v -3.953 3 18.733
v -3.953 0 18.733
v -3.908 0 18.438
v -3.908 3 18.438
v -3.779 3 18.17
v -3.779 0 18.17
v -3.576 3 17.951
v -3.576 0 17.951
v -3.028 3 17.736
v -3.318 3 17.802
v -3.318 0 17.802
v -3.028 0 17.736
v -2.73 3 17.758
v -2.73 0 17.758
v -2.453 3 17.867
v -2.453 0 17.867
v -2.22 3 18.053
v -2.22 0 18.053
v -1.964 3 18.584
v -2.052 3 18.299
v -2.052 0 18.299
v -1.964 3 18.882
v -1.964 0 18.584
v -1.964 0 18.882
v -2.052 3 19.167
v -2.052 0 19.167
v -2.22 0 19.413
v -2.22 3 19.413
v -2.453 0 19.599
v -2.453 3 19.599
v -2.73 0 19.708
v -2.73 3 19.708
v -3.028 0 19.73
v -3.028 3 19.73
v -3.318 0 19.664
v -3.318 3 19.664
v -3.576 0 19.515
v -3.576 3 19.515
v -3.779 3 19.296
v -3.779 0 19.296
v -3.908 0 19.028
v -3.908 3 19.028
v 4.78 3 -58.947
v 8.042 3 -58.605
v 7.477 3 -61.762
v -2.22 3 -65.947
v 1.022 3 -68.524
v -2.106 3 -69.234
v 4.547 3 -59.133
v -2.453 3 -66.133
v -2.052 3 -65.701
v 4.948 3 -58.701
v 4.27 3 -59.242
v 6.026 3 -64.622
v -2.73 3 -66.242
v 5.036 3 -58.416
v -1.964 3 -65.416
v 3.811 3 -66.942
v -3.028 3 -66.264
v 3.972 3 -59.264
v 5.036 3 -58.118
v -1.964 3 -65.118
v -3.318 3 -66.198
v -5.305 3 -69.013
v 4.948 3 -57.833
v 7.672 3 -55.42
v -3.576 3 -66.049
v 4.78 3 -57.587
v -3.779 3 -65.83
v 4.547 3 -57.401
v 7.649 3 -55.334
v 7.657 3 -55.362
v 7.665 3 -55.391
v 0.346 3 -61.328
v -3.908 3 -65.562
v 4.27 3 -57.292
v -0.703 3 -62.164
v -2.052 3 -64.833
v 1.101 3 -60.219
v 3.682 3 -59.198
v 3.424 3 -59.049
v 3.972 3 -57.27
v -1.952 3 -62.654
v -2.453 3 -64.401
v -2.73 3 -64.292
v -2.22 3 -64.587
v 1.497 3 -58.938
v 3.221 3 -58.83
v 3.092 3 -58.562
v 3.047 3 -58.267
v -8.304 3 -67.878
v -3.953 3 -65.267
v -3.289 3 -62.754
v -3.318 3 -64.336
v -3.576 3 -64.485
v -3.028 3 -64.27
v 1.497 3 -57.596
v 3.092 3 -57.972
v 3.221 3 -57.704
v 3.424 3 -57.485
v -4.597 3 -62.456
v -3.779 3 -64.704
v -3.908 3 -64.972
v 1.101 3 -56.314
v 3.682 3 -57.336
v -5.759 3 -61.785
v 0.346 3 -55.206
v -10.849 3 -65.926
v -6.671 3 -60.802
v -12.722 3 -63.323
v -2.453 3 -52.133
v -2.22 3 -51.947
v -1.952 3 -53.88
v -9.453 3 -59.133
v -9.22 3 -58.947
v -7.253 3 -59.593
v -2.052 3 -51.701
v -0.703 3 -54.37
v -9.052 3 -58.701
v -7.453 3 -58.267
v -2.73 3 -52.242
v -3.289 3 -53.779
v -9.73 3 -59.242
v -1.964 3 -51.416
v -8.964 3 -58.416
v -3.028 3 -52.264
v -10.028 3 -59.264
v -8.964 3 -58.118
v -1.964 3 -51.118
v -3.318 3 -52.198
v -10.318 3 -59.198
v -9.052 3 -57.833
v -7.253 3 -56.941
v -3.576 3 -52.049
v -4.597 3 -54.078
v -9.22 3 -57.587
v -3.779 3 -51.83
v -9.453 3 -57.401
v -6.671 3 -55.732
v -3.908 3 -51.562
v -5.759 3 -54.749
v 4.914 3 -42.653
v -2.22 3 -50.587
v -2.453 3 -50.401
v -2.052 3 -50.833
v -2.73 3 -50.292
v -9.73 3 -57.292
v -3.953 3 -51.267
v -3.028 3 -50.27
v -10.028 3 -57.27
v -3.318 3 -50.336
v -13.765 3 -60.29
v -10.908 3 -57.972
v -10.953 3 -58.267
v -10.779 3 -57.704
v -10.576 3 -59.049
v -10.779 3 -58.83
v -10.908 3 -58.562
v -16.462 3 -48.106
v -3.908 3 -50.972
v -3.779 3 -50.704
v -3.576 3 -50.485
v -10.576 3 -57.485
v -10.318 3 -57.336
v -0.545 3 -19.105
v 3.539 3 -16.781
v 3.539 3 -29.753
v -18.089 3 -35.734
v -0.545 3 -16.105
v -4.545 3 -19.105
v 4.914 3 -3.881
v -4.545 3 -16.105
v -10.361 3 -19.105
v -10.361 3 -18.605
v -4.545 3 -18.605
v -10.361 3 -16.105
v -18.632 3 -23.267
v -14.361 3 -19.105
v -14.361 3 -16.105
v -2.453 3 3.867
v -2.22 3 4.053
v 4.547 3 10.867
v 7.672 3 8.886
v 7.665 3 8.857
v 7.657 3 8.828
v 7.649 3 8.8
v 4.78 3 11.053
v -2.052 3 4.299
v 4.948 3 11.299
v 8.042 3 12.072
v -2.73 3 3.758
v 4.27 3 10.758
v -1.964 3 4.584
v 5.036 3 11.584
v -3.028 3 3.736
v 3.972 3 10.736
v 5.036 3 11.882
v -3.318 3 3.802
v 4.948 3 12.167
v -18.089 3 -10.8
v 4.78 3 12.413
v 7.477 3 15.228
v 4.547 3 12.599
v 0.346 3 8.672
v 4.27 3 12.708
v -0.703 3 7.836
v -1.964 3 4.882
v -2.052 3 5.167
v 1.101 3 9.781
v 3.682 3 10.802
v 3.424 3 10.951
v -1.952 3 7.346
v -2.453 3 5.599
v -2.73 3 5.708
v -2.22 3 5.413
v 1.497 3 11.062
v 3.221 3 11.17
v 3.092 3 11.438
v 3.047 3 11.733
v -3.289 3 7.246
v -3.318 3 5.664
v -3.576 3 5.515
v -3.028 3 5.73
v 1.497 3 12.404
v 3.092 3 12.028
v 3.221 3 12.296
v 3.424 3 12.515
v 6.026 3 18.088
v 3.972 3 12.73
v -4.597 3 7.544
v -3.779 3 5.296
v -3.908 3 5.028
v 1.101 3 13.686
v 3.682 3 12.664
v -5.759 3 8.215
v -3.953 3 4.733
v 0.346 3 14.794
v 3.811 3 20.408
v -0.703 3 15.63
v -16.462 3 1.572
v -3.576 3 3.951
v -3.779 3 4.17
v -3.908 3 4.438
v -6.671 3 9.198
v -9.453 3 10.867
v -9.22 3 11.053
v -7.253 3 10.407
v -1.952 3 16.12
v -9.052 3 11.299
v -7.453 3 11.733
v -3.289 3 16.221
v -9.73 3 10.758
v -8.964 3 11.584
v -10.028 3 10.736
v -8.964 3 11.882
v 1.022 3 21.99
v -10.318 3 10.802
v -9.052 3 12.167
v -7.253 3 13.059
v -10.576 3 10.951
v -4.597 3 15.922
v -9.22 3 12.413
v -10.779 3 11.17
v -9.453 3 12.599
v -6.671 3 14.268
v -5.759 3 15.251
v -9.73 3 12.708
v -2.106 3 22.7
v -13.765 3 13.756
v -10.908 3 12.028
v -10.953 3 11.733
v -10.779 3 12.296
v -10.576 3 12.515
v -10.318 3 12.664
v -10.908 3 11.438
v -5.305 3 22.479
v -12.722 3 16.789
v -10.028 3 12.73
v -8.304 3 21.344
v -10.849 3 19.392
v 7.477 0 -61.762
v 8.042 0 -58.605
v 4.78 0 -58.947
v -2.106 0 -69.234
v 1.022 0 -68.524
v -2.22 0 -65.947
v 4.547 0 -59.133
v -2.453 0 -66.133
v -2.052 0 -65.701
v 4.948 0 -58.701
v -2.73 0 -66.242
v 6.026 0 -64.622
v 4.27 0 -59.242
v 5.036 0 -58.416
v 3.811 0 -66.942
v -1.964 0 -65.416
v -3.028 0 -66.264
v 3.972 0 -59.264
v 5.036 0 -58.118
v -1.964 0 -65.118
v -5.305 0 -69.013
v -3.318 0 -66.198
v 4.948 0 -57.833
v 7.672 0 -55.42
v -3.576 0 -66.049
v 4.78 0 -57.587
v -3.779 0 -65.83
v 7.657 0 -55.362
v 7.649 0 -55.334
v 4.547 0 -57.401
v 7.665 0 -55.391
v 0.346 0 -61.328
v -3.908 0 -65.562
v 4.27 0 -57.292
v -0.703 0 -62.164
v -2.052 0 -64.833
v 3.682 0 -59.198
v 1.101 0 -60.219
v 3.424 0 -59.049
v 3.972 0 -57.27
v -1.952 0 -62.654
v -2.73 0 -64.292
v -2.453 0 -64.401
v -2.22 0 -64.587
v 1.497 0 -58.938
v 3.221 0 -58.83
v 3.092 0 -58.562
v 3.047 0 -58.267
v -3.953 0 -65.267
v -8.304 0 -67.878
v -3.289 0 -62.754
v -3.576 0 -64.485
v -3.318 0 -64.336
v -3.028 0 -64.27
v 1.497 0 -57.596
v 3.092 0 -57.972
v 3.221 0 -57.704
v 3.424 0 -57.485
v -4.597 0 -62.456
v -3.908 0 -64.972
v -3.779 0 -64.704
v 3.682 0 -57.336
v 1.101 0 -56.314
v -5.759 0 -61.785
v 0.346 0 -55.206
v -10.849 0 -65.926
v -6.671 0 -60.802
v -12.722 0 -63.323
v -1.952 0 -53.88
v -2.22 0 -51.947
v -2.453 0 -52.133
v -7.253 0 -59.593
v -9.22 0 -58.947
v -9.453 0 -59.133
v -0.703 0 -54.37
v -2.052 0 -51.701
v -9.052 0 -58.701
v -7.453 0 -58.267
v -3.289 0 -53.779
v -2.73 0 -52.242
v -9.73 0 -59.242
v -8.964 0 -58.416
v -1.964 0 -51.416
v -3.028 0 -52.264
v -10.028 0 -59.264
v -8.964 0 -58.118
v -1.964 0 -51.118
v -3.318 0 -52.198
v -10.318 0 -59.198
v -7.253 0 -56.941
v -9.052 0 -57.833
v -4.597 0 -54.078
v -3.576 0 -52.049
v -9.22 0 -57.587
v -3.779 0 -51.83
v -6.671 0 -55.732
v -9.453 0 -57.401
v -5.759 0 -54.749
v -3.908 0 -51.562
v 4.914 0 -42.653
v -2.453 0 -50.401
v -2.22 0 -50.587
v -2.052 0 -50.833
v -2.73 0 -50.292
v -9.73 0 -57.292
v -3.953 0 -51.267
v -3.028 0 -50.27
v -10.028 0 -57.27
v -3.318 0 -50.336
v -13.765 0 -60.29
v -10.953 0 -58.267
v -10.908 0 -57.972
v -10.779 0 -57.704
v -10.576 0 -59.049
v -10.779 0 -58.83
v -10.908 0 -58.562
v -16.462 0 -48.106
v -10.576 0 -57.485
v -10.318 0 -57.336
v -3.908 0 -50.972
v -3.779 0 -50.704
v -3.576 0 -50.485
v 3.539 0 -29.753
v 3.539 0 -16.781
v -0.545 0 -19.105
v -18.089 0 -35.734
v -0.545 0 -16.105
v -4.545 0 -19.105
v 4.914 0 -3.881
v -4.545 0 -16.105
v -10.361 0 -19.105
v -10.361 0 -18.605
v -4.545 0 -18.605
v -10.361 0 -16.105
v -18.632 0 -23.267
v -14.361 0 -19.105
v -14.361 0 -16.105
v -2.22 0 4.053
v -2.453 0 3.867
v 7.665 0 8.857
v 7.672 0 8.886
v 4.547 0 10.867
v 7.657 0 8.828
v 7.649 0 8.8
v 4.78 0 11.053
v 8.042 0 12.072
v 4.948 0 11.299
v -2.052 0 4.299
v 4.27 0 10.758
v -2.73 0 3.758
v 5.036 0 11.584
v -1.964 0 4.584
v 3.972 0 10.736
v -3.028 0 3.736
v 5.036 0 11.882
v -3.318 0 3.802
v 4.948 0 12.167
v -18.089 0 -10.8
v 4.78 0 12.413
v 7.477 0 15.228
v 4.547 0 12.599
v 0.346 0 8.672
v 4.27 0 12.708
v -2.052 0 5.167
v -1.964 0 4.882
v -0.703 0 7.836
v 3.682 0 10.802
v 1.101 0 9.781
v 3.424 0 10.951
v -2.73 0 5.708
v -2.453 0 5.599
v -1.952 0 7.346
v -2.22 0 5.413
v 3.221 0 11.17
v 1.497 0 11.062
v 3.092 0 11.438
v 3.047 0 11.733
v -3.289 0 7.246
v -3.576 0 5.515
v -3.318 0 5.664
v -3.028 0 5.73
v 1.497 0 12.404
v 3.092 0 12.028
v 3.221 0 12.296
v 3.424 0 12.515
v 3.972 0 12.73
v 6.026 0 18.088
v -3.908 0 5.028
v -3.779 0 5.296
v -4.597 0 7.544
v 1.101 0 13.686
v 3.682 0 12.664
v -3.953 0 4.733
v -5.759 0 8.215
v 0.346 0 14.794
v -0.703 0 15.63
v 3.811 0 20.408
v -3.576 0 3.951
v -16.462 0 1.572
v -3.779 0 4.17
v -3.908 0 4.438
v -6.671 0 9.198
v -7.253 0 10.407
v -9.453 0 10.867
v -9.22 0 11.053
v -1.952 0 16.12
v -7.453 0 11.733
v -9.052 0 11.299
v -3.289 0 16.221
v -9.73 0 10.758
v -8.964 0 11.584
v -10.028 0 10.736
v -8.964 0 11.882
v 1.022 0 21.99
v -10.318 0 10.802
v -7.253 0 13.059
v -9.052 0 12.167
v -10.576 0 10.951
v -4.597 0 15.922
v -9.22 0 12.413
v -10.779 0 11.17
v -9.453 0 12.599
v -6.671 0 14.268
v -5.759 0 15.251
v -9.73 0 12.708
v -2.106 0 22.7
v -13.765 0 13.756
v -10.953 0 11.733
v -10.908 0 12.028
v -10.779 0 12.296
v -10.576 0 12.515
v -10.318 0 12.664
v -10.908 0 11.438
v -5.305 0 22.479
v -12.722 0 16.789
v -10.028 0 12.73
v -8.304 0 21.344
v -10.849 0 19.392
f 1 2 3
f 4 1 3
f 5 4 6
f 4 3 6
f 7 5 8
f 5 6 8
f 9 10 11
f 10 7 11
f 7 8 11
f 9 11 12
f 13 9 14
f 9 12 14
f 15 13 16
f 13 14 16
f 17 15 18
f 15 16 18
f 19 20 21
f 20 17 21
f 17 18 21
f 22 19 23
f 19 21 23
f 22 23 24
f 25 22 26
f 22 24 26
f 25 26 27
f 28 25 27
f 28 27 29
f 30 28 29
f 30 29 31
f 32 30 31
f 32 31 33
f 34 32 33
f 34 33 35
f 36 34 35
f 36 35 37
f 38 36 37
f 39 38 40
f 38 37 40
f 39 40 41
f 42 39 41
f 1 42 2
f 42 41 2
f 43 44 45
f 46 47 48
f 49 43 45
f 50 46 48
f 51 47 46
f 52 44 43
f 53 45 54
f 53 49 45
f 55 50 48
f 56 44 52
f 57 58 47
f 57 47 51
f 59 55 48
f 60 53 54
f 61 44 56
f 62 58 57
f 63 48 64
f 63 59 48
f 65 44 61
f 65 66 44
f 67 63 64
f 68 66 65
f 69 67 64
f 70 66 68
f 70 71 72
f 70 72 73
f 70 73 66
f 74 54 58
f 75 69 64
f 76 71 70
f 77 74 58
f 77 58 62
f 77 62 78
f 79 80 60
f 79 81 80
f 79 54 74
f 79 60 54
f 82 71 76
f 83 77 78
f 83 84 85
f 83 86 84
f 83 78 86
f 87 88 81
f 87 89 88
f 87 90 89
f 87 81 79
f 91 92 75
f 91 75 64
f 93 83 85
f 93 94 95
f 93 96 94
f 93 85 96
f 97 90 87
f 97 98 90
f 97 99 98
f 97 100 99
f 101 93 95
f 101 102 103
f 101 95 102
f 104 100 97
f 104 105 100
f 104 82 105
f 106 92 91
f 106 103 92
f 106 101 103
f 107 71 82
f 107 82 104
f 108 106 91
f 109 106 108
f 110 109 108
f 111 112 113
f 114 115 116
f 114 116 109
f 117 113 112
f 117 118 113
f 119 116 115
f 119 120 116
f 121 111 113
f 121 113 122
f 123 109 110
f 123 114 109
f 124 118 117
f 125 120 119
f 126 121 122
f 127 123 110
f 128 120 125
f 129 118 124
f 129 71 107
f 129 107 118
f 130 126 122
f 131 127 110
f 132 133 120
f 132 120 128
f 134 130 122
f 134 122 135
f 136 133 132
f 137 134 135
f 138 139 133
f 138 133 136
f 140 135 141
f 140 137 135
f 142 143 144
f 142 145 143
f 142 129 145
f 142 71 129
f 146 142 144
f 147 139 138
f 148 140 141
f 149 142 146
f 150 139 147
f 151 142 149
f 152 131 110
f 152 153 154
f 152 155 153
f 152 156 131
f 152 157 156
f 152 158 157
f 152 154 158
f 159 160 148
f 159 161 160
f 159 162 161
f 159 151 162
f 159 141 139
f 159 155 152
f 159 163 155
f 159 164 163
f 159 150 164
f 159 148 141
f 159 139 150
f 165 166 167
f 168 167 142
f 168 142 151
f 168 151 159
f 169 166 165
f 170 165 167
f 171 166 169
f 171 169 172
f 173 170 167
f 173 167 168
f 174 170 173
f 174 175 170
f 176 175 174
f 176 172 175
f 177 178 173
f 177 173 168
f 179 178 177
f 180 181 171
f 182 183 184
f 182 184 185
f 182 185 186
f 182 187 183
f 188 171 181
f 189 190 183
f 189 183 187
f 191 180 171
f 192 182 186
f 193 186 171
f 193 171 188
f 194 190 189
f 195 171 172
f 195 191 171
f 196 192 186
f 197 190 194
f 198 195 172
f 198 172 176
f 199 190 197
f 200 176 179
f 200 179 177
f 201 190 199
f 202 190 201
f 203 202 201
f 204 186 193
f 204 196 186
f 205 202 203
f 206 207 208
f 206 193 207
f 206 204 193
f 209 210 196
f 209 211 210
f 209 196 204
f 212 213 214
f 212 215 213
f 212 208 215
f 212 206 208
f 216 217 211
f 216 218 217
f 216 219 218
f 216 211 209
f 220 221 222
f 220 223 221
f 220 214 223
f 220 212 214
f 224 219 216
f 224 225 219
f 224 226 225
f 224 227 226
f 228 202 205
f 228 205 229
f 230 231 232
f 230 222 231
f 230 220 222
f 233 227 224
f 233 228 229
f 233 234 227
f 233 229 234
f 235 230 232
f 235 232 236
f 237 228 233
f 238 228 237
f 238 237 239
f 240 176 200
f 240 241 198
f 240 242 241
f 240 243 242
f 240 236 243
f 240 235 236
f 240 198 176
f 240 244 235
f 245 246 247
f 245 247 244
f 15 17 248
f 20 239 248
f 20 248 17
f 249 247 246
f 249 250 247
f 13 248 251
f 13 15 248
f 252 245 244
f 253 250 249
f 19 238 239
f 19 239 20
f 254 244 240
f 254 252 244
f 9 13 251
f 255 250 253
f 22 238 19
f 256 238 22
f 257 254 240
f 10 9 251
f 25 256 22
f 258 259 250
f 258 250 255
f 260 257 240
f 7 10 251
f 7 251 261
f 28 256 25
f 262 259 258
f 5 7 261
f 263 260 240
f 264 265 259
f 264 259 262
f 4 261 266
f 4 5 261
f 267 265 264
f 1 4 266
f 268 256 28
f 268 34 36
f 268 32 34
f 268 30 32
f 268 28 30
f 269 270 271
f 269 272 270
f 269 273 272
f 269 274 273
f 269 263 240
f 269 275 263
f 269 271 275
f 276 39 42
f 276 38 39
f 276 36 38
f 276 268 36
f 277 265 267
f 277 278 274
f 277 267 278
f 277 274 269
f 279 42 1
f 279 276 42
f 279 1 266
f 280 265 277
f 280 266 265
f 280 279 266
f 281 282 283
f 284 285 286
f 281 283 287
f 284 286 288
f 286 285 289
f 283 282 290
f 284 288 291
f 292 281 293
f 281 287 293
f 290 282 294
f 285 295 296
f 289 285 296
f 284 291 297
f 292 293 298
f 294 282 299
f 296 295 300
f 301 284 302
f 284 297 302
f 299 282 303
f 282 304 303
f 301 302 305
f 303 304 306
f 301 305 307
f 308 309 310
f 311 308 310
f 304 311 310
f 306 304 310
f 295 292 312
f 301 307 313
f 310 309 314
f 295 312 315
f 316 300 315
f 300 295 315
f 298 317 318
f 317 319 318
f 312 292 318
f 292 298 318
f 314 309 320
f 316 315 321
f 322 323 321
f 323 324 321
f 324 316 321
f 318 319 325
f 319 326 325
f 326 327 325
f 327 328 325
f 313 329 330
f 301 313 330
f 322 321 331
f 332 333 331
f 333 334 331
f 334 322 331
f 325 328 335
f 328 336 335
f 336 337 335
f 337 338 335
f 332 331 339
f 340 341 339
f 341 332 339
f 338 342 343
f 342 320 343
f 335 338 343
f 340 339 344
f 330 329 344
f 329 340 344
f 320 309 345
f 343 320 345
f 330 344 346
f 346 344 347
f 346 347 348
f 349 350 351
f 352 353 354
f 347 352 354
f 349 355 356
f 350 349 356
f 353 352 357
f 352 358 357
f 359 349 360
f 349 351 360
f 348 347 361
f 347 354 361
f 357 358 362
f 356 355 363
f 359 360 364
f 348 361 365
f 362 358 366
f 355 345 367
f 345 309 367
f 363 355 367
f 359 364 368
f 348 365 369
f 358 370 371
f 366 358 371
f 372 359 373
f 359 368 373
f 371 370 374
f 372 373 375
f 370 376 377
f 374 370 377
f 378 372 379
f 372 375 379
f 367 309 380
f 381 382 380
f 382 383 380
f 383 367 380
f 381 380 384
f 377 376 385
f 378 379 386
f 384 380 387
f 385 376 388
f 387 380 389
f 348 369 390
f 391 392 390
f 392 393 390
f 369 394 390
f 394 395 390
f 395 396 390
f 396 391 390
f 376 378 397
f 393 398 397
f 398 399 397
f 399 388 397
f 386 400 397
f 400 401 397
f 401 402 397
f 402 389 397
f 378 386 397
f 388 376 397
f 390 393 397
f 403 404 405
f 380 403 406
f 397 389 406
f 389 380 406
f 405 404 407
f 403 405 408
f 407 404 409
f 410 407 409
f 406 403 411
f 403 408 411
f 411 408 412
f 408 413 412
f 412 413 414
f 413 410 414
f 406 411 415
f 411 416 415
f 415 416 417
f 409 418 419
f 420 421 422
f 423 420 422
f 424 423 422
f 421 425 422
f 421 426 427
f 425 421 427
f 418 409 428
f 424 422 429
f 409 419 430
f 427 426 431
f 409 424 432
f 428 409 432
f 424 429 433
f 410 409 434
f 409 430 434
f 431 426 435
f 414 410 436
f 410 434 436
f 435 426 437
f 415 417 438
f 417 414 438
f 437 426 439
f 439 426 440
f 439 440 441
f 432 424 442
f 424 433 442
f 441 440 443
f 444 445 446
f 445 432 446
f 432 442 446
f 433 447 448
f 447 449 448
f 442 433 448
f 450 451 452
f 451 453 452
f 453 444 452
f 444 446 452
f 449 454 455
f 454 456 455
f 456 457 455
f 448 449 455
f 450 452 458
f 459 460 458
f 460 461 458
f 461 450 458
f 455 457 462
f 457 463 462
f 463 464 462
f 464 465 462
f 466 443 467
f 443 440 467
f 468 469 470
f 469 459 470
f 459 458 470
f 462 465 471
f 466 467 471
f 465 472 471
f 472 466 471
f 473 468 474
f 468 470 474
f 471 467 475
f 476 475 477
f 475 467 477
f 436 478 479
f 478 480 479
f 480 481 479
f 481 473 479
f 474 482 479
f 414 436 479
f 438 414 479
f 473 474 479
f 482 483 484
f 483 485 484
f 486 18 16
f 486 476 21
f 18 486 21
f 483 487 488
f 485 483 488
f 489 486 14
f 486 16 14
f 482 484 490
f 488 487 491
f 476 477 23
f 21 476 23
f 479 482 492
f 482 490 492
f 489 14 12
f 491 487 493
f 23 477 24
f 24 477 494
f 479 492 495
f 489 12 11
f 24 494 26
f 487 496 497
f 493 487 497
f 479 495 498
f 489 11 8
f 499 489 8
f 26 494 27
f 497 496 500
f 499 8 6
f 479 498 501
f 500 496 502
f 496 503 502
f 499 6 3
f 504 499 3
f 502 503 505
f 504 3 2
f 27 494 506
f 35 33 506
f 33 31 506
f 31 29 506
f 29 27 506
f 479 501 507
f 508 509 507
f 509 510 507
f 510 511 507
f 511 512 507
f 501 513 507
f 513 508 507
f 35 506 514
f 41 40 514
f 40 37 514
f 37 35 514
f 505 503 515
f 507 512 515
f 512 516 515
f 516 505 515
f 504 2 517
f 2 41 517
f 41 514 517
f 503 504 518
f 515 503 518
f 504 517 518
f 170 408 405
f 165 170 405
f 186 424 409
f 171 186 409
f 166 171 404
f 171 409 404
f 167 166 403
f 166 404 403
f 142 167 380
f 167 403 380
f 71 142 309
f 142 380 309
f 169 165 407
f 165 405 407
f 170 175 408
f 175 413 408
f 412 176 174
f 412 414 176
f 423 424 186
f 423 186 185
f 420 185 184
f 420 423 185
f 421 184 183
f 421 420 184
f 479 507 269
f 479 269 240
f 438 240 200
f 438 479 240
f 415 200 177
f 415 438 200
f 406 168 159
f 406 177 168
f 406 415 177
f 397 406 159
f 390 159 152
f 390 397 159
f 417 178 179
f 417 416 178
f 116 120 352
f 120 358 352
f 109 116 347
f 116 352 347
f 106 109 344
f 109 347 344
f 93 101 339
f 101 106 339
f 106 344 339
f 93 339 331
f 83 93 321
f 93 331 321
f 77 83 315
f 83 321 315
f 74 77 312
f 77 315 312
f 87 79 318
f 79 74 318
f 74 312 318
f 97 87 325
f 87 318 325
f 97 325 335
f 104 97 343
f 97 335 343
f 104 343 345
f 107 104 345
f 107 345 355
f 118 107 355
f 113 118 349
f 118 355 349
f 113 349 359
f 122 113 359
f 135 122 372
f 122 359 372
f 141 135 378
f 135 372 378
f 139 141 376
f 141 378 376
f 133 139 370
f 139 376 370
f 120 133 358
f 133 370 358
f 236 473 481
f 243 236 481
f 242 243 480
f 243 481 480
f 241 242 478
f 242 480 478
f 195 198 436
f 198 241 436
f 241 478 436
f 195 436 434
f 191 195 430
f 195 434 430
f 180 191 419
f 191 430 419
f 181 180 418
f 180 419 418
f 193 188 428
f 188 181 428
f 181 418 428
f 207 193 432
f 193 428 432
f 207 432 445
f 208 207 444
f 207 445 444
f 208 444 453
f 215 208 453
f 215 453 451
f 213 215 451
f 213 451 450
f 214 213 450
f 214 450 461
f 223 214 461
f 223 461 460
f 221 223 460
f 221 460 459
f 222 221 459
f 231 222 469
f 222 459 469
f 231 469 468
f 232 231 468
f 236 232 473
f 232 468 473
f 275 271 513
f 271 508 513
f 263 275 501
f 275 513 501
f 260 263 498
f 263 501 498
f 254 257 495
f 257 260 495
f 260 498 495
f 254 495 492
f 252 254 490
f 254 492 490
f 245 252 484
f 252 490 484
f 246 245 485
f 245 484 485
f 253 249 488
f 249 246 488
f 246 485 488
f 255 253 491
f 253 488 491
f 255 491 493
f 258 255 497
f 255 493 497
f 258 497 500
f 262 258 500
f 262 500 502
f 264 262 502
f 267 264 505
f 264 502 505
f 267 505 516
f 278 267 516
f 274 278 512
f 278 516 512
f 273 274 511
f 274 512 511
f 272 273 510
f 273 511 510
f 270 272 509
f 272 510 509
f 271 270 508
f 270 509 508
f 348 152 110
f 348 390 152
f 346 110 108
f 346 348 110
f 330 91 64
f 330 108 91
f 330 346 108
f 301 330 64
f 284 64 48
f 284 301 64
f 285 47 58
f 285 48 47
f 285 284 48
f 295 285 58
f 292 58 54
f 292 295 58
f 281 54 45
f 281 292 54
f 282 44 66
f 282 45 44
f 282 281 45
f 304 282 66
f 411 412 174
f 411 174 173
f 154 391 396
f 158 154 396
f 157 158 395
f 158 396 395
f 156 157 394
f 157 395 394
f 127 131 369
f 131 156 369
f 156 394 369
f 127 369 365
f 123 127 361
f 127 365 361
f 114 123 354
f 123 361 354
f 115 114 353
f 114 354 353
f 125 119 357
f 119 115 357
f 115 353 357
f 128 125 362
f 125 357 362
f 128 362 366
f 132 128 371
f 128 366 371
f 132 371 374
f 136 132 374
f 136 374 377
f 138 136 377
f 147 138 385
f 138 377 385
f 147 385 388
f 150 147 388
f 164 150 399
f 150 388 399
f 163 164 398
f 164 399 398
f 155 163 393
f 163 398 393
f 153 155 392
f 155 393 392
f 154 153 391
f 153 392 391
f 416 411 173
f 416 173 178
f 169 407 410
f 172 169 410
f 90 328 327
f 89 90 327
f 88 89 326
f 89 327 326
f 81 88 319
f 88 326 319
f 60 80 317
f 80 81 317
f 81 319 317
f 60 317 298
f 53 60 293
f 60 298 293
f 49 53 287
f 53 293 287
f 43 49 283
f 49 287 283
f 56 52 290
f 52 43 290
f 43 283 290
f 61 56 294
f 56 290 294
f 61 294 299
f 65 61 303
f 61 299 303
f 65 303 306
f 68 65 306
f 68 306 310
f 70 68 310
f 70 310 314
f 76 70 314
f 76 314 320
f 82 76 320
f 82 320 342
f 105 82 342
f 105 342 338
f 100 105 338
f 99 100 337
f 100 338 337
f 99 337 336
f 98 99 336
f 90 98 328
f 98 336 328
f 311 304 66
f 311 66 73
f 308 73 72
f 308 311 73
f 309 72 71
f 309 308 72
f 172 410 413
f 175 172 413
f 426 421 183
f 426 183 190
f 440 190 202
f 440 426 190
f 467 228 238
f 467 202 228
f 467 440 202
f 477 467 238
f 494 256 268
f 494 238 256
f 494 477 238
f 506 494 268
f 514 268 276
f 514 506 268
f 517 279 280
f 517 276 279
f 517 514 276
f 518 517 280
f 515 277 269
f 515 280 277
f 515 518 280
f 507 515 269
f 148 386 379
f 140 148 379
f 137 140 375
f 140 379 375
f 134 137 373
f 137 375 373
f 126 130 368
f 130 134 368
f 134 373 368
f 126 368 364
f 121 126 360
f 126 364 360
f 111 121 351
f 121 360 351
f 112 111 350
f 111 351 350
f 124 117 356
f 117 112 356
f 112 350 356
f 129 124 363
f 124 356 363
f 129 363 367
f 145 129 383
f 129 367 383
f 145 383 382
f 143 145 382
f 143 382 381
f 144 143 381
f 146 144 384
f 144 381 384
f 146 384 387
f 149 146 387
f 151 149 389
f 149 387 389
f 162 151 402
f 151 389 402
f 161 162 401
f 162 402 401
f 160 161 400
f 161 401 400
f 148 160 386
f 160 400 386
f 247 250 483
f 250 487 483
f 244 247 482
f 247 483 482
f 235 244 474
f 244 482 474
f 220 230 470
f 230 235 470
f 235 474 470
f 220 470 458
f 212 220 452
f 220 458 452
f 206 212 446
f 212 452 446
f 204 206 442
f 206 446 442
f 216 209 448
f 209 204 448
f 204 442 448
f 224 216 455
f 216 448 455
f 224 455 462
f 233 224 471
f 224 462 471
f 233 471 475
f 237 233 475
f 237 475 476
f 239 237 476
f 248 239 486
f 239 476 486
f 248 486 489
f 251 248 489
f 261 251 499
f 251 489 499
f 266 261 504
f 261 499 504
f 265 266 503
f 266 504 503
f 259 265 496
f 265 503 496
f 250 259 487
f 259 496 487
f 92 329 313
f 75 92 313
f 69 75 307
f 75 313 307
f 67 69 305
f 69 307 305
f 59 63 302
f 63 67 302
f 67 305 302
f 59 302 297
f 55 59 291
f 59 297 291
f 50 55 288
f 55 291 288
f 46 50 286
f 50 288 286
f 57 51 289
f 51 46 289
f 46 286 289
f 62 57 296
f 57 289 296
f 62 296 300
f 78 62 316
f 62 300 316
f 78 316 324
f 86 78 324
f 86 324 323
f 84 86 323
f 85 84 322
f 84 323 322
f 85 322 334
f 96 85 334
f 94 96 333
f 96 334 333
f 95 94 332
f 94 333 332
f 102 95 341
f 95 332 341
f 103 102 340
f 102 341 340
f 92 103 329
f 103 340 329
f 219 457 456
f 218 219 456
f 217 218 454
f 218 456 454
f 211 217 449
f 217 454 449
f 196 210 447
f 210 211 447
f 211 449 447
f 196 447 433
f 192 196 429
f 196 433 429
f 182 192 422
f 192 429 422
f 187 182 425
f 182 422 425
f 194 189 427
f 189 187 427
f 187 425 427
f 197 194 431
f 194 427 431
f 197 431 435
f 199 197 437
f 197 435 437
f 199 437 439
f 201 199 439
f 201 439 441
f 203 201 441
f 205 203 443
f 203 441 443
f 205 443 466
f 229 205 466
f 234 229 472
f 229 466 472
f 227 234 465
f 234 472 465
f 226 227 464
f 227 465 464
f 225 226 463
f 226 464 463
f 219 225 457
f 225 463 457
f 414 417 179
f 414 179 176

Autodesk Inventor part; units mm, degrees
ref_plane "YZ Plane" through (0, 0, 0) normal (1, 0, 0) x (0, 1, 0)
ref_plane "XZ Plane" through (0, 0, 0) normal (0, 1, 0) x (-1, 0, 0)
ref_plane "XY Plane" through (0, 0, 0) normal (0, 0, 1) x (1, 0, 0)
sketch "Sketch1" plane through (0, 0, 0) normal (0, 1, 0) x (-1, 0, 0)
  arc A0 (13.7652, 13.7563) -> (-7.6488, 8.7996) centre (2.9529, 11.7331) ccw
  arc A1 (-7.6488, -55.3335) -> (13.7652, -60.2902) centre (2.9529, -58.2669) ccw
  arc A2 (-7.6723, -55.4199) -> (-7.6723, 8.8861) centre (-125.5725, -23.2669) ccw
  circle A3 centre (2.9529, 11.7331) radius 4.5
  circle A4 centre (2.9529, -58.2669) radius 4.5
  circle A5 centre (2.9529, 4.7331) radius 1
  circle A6 centre (9.9529, 11.7331) radius 1
  circle A7 centre (2.9529, 18.7331) radius 1
  circle A8 centre (-4.0471, 11.7331) radius 1
  circle A9 centre (2.9529, -65.2669) radius 1
  circle A10 centre (9.9529, -58.2669) radius 1
  circle A11 centre (2.9529, -51.2669) radius 1
  circle A12 centre (-4.0471, -58.2669) radius 1
  line L0 (14.3609, -16.1054) -> (10.3609, -16.1054)
  line L1 (10.3609, -16.1054) -> (10.3609, -19.1054)
  line L2 (10.3609, -19.1054) -> (14.3609, -19.1054)
  line L3 (14.3609, -19.1054) -> (14.3609, -16.1054)
  line L4 (14.3609, -11.7669) -> (10.3609, -14.7669) construction
  line L5 (10.3609, -11.7669) -> (14.3609, -14.7669) construction
  line L6 (0.5448, -16.1054) -> (4.5448, -16.1054)
  line L7 (4.5448, -16.1054) -> (4.5448, -19.1054)
  line L8 (4.5448, -19.1054) -> (0.5448, -19.1054)
  line L9 (0.5448, -19.1054) -> (0.5448, -16.1054)
  arc A13 (13.7652, -60.2902) -> (13.7652, 13.7563) centre (-124.6252, -23.2669) ccw
  line L10 (12.3609, -13.2669) -> (12.3609, -13.2669)
  line L11 (10.3609, -18.6054) -> (4.5448, -18.6054)
  line L12 (7.4529, -18.6054) -> (7.4529, -17.6054)
  point P0 (0, 0)
  dimension "d0" = 22
  dimension "d1" = 22
  dimension "d2" = 70
  dimension "d3" = 9
  dimension "d4" = 9
  dimension "d6" = 2
  dimension "d9" = 360
  dimension "d13" = 2
  dimension "d16" = 360
  dimension "d21" = 4
  dimension "d22" = 3
  dimension "d26" = 5.8161
  dimension "d27" = 13.8161
  dimension "d28" = 0
  dimension "d30" = 1
extrude "Extrusion1" add sketch "Sketch1" along normal blind 3
sketch "Sketch2" plane through (0, 3, 0) normal (0, 1, 0) x (1, 0, 0)
  point P0 (0, 0)
sketch "Sketch3" plane through (0, 3, 0) normal (0, 1, 0) x (1, 0, 0)
  point P0 (0, 0)
properties part number "fem"
